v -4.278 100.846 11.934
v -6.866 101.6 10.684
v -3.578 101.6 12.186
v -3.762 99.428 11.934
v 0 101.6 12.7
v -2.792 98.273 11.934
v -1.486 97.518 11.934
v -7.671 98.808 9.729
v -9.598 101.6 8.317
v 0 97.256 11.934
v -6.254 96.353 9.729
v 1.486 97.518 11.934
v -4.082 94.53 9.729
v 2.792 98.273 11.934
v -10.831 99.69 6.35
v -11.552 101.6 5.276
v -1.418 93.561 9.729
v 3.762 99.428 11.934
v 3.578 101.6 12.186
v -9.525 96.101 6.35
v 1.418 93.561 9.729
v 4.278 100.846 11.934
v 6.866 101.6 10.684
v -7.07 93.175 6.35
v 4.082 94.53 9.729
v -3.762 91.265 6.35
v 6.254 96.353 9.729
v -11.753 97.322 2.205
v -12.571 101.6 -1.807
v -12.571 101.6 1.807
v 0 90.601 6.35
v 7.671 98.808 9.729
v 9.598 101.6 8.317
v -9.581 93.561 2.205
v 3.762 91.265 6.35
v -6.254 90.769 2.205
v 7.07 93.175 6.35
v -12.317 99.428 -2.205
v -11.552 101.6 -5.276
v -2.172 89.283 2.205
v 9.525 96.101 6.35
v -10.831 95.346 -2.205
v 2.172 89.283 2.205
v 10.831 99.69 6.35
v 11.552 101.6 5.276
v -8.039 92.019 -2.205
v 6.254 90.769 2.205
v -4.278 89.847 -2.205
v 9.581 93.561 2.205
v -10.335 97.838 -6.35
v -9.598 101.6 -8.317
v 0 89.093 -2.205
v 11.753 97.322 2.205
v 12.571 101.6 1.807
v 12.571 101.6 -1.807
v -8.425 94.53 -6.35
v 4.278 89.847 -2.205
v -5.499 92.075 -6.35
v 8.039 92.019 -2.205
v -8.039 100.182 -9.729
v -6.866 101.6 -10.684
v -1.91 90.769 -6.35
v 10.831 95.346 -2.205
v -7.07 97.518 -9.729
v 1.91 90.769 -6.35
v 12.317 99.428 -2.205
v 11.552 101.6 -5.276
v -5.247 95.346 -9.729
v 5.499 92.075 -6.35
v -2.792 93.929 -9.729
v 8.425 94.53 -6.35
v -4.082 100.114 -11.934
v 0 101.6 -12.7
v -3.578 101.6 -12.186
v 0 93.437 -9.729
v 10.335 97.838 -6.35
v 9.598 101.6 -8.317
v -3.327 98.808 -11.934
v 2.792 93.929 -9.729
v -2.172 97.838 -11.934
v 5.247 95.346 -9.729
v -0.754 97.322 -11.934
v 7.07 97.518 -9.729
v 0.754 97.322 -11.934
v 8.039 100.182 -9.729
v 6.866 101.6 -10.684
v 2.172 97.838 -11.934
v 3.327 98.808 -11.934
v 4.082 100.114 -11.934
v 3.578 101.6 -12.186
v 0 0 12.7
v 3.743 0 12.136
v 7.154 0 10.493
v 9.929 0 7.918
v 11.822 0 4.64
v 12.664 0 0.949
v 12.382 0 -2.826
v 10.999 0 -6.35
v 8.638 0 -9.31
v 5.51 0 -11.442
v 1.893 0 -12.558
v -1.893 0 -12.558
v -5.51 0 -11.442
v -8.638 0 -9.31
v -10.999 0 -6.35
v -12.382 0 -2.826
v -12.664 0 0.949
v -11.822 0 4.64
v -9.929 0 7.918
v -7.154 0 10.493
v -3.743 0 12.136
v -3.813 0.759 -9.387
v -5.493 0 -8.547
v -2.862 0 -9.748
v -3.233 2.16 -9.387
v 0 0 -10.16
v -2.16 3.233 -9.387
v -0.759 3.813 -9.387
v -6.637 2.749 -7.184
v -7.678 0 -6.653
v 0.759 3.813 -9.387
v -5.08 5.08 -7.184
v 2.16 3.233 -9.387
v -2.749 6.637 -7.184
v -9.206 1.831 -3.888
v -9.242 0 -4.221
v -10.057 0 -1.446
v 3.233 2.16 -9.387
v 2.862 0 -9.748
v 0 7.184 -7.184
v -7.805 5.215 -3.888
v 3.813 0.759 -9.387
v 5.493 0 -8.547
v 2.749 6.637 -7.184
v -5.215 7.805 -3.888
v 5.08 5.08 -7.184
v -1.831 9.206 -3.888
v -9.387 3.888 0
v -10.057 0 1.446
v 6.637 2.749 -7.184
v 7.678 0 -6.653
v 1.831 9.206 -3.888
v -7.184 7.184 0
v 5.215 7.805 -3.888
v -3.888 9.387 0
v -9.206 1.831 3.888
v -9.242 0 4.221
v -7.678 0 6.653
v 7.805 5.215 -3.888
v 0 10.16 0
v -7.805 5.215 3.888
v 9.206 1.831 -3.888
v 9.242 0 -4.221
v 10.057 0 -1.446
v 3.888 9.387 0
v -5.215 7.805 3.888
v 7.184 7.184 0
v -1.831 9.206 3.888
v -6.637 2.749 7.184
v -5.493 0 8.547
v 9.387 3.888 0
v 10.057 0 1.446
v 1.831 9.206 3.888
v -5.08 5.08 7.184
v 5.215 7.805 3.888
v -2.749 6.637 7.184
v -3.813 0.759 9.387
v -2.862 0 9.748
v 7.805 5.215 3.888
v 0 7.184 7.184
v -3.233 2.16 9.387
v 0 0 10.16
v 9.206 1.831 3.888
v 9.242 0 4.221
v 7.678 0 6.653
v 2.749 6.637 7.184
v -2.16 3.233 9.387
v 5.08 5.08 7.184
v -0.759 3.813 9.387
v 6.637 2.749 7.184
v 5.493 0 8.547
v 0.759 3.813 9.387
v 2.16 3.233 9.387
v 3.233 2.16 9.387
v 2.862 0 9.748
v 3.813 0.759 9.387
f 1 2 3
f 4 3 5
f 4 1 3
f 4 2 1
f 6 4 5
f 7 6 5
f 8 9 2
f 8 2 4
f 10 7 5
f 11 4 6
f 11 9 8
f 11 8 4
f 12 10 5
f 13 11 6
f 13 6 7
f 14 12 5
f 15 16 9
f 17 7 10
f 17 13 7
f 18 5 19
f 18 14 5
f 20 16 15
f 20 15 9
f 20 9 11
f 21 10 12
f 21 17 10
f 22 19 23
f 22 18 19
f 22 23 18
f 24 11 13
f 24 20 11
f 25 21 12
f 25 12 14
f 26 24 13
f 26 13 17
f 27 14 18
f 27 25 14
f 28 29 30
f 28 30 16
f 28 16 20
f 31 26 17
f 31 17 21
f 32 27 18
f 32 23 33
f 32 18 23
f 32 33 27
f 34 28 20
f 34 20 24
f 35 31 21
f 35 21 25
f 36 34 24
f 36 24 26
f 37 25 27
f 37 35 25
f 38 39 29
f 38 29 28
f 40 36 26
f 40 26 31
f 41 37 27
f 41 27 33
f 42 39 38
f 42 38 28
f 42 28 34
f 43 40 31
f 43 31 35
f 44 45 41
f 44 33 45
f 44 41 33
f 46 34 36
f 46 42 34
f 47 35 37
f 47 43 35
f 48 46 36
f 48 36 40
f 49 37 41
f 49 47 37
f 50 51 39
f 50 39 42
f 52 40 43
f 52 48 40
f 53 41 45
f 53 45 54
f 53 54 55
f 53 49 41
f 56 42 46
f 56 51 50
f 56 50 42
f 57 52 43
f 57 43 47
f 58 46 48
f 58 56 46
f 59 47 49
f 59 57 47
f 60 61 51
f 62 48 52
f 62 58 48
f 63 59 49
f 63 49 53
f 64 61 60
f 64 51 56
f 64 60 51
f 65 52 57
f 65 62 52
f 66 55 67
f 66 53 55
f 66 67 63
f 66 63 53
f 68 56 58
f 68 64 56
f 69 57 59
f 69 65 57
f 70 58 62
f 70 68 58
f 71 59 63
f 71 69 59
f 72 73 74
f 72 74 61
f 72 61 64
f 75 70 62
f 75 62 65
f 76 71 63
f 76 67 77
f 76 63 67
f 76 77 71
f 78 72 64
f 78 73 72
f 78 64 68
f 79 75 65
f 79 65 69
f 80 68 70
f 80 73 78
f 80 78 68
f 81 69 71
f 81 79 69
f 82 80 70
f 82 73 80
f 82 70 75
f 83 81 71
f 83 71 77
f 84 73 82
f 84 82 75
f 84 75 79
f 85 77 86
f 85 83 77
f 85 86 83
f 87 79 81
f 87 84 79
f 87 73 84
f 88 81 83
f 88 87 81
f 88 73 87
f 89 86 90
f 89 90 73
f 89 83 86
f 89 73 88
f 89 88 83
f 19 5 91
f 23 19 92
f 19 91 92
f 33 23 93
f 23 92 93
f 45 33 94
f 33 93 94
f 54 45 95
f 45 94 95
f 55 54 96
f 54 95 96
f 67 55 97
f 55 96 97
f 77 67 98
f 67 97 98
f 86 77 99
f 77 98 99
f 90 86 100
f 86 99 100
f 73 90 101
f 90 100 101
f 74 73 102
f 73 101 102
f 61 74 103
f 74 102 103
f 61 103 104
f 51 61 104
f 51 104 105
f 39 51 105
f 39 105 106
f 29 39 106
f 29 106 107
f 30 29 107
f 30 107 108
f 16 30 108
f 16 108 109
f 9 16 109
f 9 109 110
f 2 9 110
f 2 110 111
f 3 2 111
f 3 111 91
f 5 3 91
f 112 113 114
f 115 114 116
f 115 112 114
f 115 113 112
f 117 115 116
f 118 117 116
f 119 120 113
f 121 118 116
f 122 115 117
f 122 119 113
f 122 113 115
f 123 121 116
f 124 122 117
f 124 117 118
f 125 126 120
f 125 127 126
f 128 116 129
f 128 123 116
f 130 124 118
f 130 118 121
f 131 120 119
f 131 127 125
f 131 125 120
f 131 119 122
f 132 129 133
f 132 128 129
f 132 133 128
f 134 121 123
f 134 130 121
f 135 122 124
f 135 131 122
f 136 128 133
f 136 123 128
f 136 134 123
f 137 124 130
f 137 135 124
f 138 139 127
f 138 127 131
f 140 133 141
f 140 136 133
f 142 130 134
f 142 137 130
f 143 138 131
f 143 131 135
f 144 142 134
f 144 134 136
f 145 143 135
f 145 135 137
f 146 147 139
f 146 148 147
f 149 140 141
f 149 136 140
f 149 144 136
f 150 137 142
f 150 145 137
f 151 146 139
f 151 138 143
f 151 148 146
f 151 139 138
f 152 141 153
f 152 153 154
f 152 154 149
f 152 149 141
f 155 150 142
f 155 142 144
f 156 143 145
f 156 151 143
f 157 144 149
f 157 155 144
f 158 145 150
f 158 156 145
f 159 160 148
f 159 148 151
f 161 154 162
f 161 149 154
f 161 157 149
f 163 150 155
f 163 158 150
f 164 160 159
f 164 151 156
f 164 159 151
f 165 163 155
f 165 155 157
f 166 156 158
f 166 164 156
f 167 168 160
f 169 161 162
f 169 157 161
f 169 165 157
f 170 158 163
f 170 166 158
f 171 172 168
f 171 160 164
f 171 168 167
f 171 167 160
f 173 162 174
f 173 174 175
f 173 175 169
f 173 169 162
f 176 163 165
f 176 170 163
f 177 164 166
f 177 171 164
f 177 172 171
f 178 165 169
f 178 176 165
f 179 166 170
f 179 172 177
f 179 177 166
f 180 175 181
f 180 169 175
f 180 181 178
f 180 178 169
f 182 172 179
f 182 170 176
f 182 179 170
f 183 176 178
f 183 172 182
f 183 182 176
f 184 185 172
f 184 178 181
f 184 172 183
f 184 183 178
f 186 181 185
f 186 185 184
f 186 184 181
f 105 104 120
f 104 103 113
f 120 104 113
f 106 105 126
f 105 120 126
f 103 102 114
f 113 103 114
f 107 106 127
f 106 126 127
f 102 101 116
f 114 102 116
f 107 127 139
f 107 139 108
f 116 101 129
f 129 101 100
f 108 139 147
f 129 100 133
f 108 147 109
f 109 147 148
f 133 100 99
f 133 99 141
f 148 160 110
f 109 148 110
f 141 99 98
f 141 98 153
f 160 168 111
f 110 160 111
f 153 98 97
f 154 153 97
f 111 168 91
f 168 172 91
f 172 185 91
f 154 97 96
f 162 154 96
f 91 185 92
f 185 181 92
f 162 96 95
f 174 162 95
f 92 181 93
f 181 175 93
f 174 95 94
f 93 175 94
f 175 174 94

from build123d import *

# Parameters (mm, degrees)
SKETCH1_R           = 12.7
BOSS_EXTRUDE1_DEPTH = 101.6


with BuildPart() as part:
    # Sketch1 → Boss-Extrude1 (new body)
    with BuildSketch(Plane(origin=(0, 0, 0), x_dir=(1, 0, 0), z_dir=(0, 1, 0))):
        with Locations(Location((0, 0, 0), (0, 0, 270))):
            Circle(SKETCH1_R)
    extrude(amount=BOSS_EXTRUDE1_DEPTH)

    # Sketch2 → Cut-Revolve1 (revolve, cut)
    with BuildSketch(Plane(origin=(0, 101.6, 0), x_dir=(1, 0, 0), z_dir=(0, 1, 0))):
        with BuildLine():
            Line((0, 12.7), (0, -12.7))
            ThreePointArc((0, -12.7), (12.7, 0), (0, 12.7))
        make_face()
    revolve(axis=Axis((0, 101.6, -12.7), (0, 0, 1)), mode=Mode.SUBTRACT)

    # Sketch3 → Cut-Revolve2 (revolve, cut)
    with BuildSketch(Plane(origin=(0, 0, 0), x_dir=(-1, 0, 0), z_dir=(0, -1, 0))):
        with BuildLine():
            Line((0, -10.16), (0, 10.16))
            ThreePointArc((0, 10.16), (-10.16, 0), (0, -10.16))
        make_face()
    revolve(axis=Axis((0, 0, 10.16), (0, 0, -1)), mode=Mode.SUBTRACT)


solid = part.part
